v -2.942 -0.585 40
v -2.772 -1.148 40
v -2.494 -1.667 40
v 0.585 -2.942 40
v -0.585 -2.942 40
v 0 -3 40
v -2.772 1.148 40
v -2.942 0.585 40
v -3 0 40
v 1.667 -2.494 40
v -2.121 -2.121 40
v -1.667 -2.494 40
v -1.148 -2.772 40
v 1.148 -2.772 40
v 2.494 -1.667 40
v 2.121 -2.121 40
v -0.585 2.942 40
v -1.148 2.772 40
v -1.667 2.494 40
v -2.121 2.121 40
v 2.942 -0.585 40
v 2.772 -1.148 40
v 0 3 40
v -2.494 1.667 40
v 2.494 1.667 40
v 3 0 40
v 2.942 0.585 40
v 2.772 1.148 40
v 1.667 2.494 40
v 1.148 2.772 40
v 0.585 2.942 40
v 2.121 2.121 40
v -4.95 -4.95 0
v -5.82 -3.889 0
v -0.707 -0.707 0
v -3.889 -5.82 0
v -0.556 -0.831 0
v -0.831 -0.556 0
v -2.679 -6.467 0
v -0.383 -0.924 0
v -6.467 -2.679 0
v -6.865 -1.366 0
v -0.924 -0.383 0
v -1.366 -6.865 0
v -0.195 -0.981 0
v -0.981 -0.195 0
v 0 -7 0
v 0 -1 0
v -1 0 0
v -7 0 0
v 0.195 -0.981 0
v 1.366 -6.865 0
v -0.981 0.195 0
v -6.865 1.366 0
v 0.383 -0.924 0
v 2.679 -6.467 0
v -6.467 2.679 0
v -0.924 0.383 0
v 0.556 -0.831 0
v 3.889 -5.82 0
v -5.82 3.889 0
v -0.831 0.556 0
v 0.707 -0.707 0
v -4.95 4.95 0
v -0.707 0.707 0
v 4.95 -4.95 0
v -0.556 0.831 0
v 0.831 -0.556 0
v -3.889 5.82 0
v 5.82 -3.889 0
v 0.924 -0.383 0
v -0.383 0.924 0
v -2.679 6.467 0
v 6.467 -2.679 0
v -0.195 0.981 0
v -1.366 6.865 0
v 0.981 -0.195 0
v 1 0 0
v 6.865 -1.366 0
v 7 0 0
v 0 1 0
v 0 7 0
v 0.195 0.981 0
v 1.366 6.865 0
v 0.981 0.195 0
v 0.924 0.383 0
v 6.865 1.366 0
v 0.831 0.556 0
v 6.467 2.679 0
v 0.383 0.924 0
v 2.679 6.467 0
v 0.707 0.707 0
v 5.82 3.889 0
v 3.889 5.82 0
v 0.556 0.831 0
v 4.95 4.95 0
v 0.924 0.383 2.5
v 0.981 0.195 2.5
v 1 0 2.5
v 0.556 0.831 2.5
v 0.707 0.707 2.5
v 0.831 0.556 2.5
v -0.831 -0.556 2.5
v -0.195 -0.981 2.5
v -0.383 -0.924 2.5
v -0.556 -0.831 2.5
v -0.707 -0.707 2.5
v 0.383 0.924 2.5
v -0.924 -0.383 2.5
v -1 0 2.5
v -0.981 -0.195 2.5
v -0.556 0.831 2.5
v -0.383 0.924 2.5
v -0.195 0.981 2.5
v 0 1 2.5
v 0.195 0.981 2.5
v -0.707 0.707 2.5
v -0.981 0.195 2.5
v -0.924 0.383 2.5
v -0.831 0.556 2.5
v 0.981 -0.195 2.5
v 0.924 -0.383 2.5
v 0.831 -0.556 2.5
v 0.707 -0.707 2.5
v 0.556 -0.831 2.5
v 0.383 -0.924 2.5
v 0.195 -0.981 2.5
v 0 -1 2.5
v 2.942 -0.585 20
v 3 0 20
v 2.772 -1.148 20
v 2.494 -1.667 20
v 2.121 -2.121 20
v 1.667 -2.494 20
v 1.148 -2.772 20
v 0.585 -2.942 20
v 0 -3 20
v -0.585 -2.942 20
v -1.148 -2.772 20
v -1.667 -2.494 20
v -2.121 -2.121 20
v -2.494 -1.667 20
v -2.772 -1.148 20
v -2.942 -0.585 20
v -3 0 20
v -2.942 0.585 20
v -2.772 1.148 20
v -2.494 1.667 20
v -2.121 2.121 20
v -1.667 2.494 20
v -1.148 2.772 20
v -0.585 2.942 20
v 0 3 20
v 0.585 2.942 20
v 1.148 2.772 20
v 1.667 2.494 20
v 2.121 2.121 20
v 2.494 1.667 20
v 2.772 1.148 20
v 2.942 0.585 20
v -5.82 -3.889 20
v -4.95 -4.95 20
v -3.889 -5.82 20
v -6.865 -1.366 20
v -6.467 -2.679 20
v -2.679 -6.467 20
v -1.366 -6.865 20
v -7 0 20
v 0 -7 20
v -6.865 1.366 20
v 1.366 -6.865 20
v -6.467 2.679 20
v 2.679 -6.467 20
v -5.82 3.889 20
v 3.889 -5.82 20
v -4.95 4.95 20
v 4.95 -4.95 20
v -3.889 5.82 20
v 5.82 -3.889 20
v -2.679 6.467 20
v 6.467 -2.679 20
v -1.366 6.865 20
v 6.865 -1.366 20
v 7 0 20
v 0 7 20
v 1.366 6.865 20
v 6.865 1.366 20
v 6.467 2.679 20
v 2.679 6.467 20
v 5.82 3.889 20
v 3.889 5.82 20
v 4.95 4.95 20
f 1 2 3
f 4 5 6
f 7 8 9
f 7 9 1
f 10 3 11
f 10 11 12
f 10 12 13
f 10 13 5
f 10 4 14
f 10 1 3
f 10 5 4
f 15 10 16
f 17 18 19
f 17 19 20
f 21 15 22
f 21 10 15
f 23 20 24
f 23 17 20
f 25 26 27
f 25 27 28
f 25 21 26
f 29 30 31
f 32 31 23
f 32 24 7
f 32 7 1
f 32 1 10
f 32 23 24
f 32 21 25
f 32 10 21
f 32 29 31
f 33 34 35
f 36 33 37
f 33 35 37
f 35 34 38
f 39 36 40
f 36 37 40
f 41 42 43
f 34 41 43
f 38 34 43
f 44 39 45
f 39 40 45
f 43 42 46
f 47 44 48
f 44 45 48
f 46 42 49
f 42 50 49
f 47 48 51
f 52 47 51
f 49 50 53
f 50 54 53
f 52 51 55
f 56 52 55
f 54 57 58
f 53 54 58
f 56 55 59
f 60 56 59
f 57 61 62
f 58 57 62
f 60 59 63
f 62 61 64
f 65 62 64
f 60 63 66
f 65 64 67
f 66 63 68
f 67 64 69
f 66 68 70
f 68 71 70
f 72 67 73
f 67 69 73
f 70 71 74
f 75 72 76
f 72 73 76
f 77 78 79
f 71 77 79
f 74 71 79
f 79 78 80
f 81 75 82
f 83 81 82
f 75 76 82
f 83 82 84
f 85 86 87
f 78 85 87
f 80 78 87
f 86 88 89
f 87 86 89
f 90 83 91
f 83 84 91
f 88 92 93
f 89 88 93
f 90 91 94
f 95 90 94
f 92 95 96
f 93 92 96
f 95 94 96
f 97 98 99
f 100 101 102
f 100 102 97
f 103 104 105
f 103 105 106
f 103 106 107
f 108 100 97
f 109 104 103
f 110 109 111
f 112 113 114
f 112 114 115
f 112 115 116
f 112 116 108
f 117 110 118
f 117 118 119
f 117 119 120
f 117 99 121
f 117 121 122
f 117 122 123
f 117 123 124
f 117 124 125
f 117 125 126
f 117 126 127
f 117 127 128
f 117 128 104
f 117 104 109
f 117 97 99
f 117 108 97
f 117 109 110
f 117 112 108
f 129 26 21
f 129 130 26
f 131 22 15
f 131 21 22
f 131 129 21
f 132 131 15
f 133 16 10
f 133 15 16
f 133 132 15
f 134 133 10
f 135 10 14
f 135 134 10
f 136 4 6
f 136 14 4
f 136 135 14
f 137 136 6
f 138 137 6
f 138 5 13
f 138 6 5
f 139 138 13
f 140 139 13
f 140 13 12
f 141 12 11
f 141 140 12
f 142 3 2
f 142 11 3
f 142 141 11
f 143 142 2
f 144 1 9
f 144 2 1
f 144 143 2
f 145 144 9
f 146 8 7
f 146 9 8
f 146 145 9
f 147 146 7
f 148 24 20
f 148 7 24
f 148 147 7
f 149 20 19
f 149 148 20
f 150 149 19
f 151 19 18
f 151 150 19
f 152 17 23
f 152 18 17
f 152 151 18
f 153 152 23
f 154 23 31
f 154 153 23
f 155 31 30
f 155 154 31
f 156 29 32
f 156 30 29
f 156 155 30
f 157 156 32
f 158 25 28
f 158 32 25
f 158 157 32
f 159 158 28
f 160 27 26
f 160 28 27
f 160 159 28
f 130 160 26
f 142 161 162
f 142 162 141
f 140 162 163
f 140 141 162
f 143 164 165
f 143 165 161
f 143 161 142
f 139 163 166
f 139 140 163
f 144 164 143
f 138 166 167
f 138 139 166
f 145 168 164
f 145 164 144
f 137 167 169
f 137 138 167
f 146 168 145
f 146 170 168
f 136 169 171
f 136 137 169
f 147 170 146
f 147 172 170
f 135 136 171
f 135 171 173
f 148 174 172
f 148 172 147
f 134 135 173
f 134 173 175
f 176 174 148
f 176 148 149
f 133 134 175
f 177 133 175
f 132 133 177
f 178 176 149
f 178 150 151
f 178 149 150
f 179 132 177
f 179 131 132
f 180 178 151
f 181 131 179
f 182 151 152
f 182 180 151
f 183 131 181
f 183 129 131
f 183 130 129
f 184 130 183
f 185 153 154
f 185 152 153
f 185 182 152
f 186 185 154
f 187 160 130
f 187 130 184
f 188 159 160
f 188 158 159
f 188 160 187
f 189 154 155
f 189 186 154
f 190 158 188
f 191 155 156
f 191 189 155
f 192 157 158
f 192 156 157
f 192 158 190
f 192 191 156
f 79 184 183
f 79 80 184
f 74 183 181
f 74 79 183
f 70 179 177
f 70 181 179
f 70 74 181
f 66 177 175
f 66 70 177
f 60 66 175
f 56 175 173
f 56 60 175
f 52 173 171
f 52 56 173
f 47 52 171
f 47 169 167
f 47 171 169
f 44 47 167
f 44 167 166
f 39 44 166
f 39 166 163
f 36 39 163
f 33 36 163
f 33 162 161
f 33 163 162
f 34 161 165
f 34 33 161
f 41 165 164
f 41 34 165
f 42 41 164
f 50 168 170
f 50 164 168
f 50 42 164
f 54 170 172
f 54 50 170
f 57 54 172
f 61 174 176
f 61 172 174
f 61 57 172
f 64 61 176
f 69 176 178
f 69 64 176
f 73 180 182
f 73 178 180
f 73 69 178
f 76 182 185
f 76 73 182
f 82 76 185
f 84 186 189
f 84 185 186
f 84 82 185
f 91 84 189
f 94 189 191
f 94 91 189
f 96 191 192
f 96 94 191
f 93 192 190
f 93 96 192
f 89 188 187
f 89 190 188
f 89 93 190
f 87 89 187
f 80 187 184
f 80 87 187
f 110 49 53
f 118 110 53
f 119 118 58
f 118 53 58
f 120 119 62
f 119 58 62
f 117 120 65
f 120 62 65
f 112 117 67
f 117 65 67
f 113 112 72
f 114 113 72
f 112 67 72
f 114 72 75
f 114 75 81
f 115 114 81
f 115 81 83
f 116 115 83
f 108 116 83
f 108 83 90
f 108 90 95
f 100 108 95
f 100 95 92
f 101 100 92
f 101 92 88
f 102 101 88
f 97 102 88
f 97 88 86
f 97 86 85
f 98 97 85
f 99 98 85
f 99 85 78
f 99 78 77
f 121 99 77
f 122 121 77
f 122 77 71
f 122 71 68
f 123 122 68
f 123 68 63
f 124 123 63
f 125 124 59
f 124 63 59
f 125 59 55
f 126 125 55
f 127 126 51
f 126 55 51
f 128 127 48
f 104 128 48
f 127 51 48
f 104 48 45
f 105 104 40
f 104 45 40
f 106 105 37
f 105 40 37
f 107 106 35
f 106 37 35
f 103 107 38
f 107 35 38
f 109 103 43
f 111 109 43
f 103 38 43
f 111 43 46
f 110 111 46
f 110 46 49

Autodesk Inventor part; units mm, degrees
ref_plane "YZ Plane" through (0, 0, 0) normal (1, 0, 0) x (0, 1, 0)
ref_plane "XZ Plane" through (0, 0, 0) normal (0, 1, 0) x (-1, 0, 0)
ref_plane "XY Plane" through (0, 0, 0) normal (0, 0, 1) x (1, 0, 0)
sketch "Boceto1" plane through (0, 0, 0) normal (0, 0, 1) x (1, 0, 0)
  circle A0 centre (0, 0) radius 7
  dimension "d0" = 14
extrude "Extrusión1" add sketch "Boceto1" along normal blind 20
sketch "Boceto2" plane through (0, 0, 0) normal (0, 0, -1) x (-1, 0, 0)
  circle A0 centre (0, 0) radius 1
  dimension "d3" = 2
extrude "Extrusión2" cut sketch "Boceto2" against normal blind 2.5
sketch "Boceto3" plane through (0, 0, 20) normal (0, 0, 1) x (1, 0, 0)
  circle A0 centre (0, 0) radius 3
  dimension "d6" = 6
extrude "Extrusión3" add sketch "Boceto3" along normal blind 20
properties part number "pendulum_coupling"
